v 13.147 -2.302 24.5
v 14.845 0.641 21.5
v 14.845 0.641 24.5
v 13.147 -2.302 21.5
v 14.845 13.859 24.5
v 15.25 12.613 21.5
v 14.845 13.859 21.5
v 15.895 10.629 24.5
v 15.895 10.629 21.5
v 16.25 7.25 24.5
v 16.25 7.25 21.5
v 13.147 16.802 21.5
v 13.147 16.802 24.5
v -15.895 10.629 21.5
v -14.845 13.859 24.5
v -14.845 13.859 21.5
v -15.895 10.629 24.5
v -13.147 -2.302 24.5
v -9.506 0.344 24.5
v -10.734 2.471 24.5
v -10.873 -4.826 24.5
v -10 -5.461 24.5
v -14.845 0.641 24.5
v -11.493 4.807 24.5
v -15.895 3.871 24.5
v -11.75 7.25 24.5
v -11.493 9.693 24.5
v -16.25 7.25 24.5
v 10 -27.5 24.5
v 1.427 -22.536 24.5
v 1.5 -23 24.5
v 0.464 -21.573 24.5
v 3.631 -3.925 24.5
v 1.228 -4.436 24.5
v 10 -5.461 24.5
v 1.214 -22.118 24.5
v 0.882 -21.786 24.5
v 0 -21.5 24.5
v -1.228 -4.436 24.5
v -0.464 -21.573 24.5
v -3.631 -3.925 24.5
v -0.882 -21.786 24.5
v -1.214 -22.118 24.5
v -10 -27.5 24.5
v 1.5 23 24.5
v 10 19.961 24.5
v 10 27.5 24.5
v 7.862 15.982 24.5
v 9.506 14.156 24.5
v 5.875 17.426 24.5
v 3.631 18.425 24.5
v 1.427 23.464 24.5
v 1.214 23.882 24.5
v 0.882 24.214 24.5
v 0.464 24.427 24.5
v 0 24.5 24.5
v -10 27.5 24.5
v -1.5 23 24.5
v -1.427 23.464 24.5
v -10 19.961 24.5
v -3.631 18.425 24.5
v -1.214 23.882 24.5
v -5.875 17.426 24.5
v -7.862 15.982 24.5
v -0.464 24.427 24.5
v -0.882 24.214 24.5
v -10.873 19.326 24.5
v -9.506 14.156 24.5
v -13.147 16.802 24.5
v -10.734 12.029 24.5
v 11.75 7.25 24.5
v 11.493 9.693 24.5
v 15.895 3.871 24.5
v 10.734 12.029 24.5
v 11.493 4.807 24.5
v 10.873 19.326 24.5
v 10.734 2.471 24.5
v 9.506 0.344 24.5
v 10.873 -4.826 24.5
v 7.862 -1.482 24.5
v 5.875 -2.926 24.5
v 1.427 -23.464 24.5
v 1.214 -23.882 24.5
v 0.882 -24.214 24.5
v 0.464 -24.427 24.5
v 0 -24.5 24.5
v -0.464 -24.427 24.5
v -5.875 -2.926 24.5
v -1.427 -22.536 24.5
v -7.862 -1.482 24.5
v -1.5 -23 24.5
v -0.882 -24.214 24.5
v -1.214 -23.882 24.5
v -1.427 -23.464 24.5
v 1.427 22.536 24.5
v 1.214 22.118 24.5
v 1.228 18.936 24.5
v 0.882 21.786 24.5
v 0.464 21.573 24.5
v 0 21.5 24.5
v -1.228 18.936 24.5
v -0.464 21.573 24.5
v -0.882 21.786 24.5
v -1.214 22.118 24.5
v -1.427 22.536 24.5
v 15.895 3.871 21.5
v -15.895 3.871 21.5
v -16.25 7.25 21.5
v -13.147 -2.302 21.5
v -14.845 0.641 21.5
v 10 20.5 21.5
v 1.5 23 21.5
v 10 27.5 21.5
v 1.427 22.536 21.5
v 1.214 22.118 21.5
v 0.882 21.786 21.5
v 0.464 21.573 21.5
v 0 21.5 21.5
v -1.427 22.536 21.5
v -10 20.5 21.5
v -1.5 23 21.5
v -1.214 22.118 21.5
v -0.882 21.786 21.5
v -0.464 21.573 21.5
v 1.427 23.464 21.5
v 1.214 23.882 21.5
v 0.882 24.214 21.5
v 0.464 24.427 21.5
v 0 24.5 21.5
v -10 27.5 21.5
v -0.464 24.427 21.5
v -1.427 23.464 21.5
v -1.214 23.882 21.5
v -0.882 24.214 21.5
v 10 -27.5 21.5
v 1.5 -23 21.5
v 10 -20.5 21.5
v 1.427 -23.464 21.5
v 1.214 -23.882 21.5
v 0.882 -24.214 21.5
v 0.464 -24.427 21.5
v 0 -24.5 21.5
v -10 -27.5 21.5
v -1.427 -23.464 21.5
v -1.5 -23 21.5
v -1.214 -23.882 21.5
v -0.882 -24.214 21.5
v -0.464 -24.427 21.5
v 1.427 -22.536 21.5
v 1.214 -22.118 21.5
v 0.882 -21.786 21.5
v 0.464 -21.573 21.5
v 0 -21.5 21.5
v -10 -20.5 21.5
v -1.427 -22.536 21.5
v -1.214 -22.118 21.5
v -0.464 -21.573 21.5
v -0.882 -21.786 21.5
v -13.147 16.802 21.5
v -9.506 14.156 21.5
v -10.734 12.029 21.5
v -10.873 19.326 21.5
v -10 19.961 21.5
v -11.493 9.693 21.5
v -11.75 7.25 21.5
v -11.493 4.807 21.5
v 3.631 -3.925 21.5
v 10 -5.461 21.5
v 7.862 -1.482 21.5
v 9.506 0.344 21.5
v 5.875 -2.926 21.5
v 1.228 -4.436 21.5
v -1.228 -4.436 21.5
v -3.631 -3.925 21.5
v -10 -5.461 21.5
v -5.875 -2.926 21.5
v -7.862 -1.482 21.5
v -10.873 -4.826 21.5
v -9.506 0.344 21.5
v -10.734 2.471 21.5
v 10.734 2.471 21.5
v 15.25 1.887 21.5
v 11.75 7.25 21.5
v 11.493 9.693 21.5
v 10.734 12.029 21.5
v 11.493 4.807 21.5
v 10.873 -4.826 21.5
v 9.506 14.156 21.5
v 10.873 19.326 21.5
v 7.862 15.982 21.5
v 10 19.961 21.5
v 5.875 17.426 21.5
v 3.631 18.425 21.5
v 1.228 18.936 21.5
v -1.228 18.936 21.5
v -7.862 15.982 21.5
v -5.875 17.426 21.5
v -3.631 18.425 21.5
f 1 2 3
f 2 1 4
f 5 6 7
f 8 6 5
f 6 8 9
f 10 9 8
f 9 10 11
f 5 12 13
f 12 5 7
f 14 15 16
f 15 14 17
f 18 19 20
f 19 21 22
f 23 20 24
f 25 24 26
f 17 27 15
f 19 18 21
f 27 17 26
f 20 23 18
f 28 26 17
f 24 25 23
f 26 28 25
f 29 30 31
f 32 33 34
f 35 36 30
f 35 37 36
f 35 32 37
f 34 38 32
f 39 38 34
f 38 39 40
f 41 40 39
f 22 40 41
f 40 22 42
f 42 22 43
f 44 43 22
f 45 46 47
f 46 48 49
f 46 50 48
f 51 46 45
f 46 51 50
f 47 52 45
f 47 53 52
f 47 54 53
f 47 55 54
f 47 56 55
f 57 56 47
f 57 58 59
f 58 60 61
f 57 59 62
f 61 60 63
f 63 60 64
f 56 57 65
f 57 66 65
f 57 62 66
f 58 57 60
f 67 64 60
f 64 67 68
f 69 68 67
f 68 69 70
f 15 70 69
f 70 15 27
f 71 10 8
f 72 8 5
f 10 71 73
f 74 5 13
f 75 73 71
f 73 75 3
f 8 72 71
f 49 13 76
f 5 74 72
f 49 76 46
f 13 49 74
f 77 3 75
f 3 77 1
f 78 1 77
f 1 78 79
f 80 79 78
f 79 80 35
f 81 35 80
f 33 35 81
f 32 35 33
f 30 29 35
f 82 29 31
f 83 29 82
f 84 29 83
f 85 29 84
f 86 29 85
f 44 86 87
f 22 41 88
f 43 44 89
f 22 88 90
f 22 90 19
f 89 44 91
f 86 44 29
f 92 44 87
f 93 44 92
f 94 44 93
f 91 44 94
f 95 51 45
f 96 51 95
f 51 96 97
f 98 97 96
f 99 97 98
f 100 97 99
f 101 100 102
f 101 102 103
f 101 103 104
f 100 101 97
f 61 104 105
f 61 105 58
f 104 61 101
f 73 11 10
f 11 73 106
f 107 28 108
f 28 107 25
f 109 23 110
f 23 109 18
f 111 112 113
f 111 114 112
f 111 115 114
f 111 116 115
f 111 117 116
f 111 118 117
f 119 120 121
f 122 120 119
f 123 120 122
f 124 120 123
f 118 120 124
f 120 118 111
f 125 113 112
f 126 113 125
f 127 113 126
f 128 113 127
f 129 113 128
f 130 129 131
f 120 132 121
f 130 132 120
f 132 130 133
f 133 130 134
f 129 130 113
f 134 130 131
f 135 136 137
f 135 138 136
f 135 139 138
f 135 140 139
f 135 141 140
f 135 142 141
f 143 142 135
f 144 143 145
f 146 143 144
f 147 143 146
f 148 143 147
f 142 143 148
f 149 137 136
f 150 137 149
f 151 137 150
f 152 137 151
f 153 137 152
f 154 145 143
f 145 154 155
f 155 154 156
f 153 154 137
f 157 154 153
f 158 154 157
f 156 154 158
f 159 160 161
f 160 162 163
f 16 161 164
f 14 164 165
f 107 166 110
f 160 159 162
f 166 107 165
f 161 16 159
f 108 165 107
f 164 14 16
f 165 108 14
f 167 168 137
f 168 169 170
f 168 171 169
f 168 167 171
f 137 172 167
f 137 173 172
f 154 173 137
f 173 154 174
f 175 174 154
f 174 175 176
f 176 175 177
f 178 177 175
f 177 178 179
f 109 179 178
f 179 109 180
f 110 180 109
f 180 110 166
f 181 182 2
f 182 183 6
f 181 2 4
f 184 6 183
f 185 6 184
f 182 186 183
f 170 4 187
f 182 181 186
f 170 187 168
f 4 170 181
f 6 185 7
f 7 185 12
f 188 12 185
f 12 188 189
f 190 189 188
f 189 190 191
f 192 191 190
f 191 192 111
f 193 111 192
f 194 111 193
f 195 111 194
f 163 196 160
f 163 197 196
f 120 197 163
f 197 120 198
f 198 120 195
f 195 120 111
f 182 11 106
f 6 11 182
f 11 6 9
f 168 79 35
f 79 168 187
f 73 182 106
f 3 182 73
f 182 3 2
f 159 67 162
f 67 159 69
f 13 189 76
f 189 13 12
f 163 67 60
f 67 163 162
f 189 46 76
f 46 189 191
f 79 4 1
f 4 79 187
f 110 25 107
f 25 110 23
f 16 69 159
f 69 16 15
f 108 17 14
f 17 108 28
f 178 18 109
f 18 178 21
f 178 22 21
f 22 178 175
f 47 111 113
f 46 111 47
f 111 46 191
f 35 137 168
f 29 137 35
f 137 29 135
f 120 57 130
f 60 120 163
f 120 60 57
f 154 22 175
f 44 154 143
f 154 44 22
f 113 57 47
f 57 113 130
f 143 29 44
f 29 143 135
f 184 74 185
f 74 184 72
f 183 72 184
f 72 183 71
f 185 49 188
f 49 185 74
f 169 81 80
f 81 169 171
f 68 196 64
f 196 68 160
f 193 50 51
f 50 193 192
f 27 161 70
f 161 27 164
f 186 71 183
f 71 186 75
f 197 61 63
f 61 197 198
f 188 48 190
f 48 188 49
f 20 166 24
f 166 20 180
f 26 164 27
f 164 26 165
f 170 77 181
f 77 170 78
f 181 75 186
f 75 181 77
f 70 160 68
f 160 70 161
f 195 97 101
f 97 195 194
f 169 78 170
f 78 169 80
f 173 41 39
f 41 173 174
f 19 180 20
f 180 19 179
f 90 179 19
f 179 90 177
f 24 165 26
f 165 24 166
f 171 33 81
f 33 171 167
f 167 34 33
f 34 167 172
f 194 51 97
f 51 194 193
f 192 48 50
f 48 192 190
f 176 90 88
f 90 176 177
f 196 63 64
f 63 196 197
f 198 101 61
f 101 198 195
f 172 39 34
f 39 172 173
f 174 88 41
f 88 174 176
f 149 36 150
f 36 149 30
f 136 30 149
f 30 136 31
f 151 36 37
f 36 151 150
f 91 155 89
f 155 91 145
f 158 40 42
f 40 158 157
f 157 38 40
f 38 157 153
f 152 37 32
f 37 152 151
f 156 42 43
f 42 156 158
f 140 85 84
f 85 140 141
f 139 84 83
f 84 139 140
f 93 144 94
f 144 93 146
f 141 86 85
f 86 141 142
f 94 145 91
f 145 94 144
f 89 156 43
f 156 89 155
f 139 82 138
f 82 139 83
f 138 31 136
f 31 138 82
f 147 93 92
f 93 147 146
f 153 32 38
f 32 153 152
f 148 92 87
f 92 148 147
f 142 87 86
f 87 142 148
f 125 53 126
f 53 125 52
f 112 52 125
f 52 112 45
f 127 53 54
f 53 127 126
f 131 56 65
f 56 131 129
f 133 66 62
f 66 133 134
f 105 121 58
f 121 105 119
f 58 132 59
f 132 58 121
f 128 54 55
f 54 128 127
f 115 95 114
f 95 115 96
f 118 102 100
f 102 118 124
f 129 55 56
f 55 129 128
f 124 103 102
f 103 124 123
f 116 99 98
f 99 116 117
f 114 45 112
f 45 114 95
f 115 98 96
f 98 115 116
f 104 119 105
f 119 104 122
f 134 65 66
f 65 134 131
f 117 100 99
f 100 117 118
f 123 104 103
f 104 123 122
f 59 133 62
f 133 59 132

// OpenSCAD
xc=-3.5-23.5/2;
h=3;

module gopro(){
	translate([-xc,-41/2,0]){
		translate([xc,16+23.5/2,21.5])
			cylinder(d=23.5,h=7);
		translate([-60,0,0])
			cube([60,41,21.5]);
	}
}

module mount(){
	translate([-31+2-xc,45/-2,-2]){
		cube([31,45,9.5]);
		translate([14.5,-0.5,0])
			cylinder(d=5,h=9.5);
		translate([14.5,0.5+45,0])
			cylinder(d=5,h=9.5);
	}
}

difference(){
	union(){
		translate([0,-41/2+16+23.5/2,21.5])
			cylinder(d=23.5+3*3,h=h);
		translate([-10,-27.5,21.5])
			cube([20,55,h]);
	}
	color("red"){
		gopro();
		mount();
	}
	translate([0,-23,0])
		cylinder(d=3,h=30,$fn=20);
	translate([0,23,0])
		cylinder(d=3,h=30,$fn=20);
}
